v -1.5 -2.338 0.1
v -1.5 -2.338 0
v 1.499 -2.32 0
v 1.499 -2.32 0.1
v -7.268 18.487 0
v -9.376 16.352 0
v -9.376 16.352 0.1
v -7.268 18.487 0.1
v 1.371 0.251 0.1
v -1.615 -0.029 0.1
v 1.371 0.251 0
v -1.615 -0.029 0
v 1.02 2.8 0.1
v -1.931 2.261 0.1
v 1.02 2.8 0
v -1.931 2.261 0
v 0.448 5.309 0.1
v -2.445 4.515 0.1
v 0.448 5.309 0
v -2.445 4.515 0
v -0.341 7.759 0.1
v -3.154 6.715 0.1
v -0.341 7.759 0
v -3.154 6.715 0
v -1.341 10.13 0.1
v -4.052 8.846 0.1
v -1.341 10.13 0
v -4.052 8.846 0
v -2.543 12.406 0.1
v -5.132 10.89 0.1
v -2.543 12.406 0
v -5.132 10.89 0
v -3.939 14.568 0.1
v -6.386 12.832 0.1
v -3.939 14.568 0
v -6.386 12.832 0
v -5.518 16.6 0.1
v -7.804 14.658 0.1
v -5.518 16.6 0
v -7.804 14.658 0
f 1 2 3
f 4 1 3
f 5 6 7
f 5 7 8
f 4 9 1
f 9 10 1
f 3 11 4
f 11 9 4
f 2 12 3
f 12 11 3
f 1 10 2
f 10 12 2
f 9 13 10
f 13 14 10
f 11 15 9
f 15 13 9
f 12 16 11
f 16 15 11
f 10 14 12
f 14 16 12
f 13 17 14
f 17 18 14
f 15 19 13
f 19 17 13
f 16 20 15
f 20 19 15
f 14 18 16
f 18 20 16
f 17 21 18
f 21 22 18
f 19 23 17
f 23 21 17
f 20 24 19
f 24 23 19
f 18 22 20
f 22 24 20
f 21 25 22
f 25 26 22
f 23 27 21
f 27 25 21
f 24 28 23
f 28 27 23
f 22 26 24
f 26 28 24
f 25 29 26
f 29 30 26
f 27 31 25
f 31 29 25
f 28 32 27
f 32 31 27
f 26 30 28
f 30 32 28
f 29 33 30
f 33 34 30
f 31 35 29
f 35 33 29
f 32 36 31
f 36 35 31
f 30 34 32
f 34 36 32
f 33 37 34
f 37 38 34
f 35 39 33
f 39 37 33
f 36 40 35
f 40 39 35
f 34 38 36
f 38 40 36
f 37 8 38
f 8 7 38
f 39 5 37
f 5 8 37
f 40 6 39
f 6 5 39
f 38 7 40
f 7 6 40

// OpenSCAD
use <lib.scad>

//#box([21,21,1]);
//#box([9,9,1]);

module straight() {
	translate([0,0,0.05]) box([3,1,0.1]);
}

module diagonal() {
	translate([0,0,0.05]) rotate([0,0,45]) box([5,1,0.1]);
}

module cornerLeftHD($fn=72) {
	radius=26.5;
	translate([-radius-1.5,-2.5,0]) rotate([0,0,0.35]) rotate_extrude(angle=45) translate([radius,0,0]) square([3,0.1]);
}

module cornerRightHD() {
	mirror([1,0,0]) cornerLeftHD();
}

module cornerRightLD() {
	mirror([1,0,0]) cornerLeftLD();
}

//for (i = [0:1:3]) translate([0,i*9,0]) straight();
//translate([0,27,0]) rotate([0,0,-90]) for (i = [0:1:3]) translate([0,i*9,0]) straight();
//straight();
//diagonal();
cornerLeftHD();
//cornerRightHD();
//translate([0,0,0.5]) cornerRightHD();
//translate([0,0,0.5]) cornerRightHD();
//translate([0,-9,0.5]) cornerRightHD();
//translate([-20,20,0]) diagonal();
//translate([-40,40,0]) rotate([0,0,45]) cornerLeftHD();
//translate([-40,40,0]) rotate([0,0,180]) cornerLeftHD();
//cornerRightHD();
